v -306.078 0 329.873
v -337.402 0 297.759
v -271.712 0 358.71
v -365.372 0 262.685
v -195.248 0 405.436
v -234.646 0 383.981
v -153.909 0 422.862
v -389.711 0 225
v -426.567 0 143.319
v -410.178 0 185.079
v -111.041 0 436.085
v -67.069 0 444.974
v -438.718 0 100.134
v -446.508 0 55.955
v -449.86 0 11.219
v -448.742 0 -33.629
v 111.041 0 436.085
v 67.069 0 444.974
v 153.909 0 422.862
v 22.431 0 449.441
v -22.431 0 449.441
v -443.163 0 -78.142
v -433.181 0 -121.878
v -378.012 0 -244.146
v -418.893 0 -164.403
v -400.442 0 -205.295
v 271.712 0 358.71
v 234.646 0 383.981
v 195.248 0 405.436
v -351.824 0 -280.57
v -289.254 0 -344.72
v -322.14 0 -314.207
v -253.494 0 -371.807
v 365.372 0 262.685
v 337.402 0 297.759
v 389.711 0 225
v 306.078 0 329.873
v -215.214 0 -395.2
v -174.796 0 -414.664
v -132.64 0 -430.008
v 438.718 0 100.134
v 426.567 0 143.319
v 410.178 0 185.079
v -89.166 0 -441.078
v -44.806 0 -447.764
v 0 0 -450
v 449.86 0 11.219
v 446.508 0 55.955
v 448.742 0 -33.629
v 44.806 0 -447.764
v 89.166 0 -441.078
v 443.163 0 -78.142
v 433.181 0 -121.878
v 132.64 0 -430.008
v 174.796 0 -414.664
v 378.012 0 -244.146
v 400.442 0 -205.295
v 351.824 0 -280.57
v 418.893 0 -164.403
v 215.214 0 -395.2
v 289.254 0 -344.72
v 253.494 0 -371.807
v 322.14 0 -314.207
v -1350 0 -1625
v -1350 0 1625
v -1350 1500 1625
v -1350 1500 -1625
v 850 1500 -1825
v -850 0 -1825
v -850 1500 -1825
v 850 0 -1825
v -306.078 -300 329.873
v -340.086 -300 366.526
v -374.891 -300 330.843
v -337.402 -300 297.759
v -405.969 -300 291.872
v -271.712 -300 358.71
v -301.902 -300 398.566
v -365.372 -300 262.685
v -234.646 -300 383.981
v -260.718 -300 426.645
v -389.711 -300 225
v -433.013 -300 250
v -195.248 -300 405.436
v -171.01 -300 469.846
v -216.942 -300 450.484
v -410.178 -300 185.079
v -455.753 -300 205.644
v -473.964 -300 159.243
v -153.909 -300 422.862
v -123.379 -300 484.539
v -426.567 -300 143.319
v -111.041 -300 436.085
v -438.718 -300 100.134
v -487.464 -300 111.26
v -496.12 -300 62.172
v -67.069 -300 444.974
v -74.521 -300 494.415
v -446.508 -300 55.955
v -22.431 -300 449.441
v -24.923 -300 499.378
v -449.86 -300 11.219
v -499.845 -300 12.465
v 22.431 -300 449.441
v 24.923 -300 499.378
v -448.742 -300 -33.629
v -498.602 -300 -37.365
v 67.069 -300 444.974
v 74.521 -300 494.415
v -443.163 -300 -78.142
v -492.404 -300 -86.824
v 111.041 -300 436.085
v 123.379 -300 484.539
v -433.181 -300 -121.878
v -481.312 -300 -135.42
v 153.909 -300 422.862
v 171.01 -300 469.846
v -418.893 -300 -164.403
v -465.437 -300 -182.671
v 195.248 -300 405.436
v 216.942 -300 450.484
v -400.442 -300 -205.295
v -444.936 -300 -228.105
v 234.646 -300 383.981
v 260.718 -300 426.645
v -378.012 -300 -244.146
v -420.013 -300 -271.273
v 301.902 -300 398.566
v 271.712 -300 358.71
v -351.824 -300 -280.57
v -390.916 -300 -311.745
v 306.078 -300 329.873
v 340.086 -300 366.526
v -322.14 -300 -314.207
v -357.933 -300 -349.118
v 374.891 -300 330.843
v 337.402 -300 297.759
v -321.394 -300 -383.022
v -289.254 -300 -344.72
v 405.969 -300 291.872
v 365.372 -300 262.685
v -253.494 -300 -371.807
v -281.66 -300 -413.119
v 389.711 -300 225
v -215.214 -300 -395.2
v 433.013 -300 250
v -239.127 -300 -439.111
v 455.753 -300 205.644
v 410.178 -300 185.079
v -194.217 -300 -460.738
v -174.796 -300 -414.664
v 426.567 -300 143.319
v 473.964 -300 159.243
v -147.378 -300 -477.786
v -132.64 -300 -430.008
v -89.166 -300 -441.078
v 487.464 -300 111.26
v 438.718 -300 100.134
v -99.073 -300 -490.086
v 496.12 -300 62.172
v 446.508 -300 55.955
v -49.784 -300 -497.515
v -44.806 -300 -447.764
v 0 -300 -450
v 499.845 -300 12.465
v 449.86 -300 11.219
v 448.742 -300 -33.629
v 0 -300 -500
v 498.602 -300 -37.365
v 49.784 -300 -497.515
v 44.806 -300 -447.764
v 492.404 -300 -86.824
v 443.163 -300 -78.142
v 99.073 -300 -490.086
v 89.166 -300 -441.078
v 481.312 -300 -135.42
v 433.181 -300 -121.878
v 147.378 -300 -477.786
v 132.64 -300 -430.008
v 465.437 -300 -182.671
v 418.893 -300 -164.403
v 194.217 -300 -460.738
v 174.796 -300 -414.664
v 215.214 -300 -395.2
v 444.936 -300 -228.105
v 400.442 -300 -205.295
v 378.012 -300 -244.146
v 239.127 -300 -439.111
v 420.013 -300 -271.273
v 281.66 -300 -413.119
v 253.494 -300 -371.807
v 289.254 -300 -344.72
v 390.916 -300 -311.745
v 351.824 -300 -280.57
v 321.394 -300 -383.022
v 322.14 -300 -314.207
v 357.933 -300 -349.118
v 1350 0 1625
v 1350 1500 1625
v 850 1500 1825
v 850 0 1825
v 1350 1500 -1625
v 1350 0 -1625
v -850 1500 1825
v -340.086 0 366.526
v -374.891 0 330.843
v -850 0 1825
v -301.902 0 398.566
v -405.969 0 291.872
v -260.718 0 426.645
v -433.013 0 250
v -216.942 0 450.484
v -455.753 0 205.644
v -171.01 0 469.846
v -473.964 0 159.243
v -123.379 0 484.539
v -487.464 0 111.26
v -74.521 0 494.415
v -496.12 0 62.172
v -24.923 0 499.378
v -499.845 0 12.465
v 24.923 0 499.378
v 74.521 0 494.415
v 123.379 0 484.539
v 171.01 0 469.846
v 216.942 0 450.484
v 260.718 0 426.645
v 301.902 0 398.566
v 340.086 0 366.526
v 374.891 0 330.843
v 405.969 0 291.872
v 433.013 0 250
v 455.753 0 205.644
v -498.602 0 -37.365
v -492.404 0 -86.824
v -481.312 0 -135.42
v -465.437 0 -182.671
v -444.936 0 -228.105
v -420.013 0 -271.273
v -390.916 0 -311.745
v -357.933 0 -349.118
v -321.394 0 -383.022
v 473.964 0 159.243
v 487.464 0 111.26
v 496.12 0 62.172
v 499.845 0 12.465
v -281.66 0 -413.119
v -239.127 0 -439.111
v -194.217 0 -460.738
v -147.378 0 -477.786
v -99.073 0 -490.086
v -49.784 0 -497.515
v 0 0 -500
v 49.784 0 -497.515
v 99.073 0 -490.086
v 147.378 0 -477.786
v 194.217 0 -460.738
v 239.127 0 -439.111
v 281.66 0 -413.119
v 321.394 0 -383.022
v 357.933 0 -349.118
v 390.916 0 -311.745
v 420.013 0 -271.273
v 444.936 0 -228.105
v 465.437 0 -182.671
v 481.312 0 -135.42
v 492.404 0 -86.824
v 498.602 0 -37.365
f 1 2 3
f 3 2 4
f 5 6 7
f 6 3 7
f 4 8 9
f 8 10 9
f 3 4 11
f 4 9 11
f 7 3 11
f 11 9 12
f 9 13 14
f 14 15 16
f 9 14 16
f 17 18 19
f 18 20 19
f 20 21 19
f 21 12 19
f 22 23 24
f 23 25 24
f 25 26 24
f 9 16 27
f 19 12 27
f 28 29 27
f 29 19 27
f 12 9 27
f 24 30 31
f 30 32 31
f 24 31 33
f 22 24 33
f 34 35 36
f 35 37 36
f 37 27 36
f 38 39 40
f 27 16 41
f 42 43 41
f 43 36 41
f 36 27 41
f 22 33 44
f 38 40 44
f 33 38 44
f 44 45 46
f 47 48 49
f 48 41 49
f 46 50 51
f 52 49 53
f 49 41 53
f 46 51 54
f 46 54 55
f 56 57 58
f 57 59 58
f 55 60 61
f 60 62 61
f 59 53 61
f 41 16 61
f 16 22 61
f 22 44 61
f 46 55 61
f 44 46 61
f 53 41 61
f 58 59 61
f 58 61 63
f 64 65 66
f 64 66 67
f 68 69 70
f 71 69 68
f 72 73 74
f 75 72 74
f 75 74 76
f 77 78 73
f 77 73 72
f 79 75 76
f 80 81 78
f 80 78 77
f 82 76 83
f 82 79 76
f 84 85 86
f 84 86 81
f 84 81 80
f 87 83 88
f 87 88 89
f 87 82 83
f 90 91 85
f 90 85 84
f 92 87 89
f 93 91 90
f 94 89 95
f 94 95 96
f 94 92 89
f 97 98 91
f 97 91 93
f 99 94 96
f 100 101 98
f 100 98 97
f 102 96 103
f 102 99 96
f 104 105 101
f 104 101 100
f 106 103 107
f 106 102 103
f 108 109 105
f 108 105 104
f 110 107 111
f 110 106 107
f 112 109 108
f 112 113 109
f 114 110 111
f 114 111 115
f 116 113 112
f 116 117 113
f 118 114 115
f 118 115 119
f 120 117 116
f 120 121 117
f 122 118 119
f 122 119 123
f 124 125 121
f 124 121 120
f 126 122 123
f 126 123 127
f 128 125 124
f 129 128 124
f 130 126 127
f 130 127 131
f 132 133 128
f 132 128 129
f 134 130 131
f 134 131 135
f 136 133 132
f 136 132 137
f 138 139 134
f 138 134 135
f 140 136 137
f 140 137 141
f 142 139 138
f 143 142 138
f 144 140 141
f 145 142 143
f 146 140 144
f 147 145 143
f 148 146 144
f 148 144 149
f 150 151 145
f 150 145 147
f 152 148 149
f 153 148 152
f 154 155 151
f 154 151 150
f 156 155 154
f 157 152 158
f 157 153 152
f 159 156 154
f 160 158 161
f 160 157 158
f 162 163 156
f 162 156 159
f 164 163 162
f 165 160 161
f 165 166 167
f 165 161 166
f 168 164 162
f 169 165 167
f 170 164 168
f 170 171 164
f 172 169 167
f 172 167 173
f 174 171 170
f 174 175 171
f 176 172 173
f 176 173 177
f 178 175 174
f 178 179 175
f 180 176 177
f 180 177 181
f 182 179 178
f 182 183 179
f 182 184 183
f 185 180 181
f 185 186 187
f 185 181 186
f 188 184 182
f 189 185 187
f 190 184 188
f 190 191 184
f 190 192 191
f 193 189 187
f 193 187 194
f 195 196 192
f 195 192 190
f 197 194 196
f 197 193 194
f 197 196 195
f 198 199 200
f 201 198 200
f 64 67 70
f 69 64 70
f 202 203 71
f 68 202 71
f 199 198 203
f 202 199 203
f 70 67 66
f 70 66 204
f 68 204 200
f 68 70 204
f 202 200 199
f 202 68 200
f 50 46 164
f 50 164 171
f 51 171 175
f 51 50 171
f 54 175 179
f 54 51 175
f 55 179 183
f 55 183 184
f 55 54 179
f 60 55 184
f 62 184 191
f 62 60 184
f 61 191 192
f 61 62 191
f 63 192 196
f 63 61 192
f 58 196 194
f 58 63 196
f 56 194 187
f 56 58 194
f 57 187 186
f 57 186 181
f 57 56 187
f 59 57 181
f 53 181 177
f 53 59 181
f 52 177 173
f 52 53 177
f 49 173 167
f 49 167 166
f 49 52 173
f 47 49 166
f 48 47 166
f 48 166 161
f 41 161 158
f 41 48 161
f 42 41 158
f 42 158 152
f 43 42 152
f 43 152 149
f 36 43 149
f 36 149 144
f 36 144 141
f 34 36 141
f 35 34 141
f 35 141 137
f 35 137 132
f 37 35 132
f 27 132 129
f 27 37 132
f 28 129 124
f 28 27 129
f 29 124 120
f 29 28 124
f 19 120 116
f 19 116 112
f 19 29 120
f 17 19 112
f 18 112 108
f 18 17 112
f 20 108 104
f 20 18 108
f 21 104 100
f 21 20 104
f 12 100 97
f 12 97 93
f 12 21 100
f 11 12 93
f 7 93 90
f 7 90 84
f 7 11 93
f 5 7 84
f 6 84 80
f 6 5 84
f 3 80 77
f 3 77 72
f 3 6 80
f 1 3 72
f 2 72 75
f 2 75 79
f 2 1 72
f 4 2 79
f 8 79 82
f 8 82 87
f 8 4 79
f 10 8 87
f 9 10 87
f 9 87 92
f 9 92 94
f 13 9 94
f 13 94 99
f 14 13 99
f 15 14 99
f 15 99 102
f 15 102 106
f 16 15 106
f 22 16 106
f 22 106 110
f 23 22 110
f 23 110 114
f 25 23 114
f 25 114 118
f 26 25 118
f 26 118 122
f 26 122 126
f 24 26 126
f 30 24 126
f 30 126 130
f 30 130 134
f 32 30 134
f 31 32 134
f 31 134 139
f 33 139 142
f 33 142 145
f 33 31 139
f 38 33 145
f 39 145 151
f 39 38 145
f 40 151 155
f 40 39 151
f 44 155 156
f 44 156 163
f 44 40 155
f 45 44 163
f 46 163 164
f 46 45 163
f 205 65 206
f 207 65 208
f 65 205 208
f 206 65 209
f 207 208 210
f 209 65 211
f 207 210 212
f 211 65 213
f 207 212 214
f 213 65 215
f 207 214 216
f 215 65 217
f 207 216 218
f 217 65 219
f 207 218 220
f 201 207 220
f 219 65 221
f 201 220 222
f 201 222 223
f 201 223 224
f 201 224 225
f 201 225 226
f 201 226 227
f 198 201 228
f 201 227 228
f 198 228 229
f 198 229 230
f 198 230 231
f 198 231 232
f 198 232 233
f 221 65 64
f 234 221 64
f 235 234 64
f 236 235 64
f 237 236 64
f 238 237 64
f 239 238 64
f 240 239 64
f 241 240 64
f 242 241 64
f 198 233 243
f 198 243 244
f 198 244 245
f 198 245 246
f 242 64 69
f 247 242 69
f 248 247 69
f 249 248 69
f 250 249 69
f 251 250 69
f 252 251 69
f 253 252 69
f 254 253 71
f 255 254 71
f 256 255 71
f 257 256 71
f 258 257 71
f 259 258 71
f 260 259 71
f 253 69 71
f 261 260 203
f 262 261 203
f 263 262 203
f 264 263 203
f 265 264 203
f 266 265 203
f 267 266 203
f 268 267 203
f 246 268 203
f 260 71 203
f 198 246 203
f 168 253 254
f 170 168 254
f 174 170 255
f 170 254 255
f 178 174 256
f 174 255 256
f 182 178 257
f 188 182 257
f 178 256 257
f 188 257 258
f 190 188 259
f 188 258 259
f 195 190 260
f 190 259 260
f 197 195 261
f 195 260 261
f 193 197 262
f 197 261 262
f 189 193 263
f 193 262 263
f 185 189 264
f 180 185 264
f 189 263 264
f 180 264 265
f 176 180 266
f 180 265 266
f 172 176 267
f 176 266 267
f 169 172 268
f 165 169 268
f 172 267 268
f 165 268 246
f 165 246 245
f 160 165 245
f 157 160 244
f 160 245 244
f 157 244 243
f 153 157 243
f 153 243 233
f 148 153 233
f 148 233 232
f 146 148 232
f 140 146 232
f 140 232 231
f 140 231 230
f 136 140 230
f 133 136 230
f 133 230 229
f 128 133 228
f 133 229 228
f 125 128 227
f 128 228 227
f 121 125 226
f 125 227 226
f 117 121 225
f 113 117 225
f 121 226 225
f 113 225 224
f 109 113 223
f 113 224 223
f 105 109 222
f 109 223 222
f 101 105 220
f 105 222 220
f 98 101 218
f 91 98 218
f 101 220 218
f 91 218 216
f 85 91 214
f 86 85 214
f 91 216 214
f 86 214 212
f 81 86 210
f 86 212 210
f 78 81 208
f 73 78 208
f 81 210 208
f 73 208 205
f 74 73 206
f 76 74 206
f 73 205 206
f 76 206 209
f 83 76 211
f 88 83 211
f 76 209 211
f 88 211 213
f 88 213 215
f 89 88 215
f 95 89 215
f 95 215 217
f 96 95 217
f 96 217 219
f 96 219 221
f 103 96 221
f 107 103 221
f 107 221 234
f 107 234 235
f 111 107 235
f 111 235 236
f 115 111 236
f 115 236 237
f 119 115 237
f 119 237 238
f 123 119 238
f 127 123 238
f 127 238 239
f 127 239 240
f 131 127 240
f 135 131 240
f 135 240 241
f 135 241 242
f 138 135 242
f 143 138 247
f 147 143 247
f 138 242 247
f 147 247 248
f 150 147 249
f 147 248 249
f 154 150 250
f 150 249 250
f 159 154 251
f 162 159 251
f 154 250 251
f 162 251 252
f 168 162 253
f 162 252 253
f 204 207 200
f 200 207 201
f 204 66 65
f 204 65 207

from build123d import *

# Parameters (mm, degrees)
SCHIZZO2_W                   = 2700
SCHIZZO2_H                   = 3650
ESTRUSIONE_ESTRUSIONE1_DEPTH = 1500
TAGLIO_ESTRUSIONE1_DEPTH     = 2721.868427543
SPECCHIA2_COPY_1_DEPTH       = 2721.868427543
SPECCHIA2_COPY_2_DEPTH       = 2721.868427543
SPECCHIA2_COPY_3_DEPTH       = 2721.868427543
SCHIZZO5_R                   = 500
SCHIZZO5_R_2                 = 450
ESTRUSIONE_ESTRUSIONE3_DEPTH = 300


with BuildPart() as part:
    # Schizzo2 → Estrusione-Estrusione1 (new body)
    with BuildSketch(Plane(origin=(0, 0, 0), x_dir=(1, 0, 0), z_dir=(0, 1, 0))):
        Rectangle(SCHIZZO2_W, SCHIZZO2_H)
    extrude(amount=ESTRUSIONE_ESTRUSIONE1_DEPTH)

    # Schizzo3 → Taglio-Estrusione1 (cut, through all)
    with BuildSketch(Plane(origin=(0, 1500, 0), x_dir=(1, 0, 0), z_dir=(0, 1, 0))):
        Polygon((-1350, 1825), (-1350, 1625), (-850, 1825), align=None)
    taglio_estrusione1 = extrude(amount=-TAGLIO_ESTRUSIONE1_DEPTH, mode=Mode.SUBTRACT)

    # Specchia1: Taglio-Estrusione1 across plane
    add(taglio_estrusione1.mirror(Plane.XY), mode=Mode.SUBTRACT)

    # Specchia1 at the second plane: Taglio-Estrusione1 across plane
    add(taglio_estrusione1.mirror(Plane.ZX), mode=Mode.SUBTRACT)

    # Specchia2 copy 1 sketch → Specchia2 copy 1 (cut, through all)
    with BuildSketch(Plane(origin=(0, 1500, 0), x_dir=(-1, 0, 0), z_dir=(0, 1, 0))):
        Polygon((-1350, 1825), (-1350, 1625), (-850, 1825), align=None)
    extrude(amount=-SPECCHIA2_COPY_1_DEPTH, mode=Mode.SUBTRACT)

    # Specchia2 copy 2 sketch → Specchia2 copy 2 (cut, through all)
    with BuildSketch(Plane(origin=(0, -1500, 0), x_dir=(-1, 0, 0), z_dir=(0, -1, 0))):
        Polygon((-1350, 1825), (-1350, 1625), (-850, 1825), align=None)
    extrude(amount=-SPECCHIA2_COPY_2_DEPTH, mode=Mode.SUBTRACT)

    # Specchia2 copy 3 sketch → Specchia2 copy 3 (cut, through all)
    with BuildSketch(Plane(origin=(0, 1500, 0), x_dir=(-1, 0, 0), z_dir=(0, 1, 0))):
        Polygon((-1350, -1825), (-1350, -1625), (-850, -1825), align=None)
    extrude(amount=-SPECCHIA2_COPY_3_DEPTH, mode=Mode.SUBTRACT)

    # Schizzo5 → Estrusione-Estrusione3 (add)
    with BuildSketch(Plane.XZ):
        with Locations(Location((0, 0, 0), (0, 0, 270))):
            Circle(SCHIZZO5_R)
        with Locations(Location((0, 0, 0), (0, 0, 270))):
            Circle(SCHIZZO5_R_2, mode=Mode.SUBTRACT)
    extrude(amount=ESTRUSIONE_ESTRUSIONE3_DEPTH)


solid = part.part
